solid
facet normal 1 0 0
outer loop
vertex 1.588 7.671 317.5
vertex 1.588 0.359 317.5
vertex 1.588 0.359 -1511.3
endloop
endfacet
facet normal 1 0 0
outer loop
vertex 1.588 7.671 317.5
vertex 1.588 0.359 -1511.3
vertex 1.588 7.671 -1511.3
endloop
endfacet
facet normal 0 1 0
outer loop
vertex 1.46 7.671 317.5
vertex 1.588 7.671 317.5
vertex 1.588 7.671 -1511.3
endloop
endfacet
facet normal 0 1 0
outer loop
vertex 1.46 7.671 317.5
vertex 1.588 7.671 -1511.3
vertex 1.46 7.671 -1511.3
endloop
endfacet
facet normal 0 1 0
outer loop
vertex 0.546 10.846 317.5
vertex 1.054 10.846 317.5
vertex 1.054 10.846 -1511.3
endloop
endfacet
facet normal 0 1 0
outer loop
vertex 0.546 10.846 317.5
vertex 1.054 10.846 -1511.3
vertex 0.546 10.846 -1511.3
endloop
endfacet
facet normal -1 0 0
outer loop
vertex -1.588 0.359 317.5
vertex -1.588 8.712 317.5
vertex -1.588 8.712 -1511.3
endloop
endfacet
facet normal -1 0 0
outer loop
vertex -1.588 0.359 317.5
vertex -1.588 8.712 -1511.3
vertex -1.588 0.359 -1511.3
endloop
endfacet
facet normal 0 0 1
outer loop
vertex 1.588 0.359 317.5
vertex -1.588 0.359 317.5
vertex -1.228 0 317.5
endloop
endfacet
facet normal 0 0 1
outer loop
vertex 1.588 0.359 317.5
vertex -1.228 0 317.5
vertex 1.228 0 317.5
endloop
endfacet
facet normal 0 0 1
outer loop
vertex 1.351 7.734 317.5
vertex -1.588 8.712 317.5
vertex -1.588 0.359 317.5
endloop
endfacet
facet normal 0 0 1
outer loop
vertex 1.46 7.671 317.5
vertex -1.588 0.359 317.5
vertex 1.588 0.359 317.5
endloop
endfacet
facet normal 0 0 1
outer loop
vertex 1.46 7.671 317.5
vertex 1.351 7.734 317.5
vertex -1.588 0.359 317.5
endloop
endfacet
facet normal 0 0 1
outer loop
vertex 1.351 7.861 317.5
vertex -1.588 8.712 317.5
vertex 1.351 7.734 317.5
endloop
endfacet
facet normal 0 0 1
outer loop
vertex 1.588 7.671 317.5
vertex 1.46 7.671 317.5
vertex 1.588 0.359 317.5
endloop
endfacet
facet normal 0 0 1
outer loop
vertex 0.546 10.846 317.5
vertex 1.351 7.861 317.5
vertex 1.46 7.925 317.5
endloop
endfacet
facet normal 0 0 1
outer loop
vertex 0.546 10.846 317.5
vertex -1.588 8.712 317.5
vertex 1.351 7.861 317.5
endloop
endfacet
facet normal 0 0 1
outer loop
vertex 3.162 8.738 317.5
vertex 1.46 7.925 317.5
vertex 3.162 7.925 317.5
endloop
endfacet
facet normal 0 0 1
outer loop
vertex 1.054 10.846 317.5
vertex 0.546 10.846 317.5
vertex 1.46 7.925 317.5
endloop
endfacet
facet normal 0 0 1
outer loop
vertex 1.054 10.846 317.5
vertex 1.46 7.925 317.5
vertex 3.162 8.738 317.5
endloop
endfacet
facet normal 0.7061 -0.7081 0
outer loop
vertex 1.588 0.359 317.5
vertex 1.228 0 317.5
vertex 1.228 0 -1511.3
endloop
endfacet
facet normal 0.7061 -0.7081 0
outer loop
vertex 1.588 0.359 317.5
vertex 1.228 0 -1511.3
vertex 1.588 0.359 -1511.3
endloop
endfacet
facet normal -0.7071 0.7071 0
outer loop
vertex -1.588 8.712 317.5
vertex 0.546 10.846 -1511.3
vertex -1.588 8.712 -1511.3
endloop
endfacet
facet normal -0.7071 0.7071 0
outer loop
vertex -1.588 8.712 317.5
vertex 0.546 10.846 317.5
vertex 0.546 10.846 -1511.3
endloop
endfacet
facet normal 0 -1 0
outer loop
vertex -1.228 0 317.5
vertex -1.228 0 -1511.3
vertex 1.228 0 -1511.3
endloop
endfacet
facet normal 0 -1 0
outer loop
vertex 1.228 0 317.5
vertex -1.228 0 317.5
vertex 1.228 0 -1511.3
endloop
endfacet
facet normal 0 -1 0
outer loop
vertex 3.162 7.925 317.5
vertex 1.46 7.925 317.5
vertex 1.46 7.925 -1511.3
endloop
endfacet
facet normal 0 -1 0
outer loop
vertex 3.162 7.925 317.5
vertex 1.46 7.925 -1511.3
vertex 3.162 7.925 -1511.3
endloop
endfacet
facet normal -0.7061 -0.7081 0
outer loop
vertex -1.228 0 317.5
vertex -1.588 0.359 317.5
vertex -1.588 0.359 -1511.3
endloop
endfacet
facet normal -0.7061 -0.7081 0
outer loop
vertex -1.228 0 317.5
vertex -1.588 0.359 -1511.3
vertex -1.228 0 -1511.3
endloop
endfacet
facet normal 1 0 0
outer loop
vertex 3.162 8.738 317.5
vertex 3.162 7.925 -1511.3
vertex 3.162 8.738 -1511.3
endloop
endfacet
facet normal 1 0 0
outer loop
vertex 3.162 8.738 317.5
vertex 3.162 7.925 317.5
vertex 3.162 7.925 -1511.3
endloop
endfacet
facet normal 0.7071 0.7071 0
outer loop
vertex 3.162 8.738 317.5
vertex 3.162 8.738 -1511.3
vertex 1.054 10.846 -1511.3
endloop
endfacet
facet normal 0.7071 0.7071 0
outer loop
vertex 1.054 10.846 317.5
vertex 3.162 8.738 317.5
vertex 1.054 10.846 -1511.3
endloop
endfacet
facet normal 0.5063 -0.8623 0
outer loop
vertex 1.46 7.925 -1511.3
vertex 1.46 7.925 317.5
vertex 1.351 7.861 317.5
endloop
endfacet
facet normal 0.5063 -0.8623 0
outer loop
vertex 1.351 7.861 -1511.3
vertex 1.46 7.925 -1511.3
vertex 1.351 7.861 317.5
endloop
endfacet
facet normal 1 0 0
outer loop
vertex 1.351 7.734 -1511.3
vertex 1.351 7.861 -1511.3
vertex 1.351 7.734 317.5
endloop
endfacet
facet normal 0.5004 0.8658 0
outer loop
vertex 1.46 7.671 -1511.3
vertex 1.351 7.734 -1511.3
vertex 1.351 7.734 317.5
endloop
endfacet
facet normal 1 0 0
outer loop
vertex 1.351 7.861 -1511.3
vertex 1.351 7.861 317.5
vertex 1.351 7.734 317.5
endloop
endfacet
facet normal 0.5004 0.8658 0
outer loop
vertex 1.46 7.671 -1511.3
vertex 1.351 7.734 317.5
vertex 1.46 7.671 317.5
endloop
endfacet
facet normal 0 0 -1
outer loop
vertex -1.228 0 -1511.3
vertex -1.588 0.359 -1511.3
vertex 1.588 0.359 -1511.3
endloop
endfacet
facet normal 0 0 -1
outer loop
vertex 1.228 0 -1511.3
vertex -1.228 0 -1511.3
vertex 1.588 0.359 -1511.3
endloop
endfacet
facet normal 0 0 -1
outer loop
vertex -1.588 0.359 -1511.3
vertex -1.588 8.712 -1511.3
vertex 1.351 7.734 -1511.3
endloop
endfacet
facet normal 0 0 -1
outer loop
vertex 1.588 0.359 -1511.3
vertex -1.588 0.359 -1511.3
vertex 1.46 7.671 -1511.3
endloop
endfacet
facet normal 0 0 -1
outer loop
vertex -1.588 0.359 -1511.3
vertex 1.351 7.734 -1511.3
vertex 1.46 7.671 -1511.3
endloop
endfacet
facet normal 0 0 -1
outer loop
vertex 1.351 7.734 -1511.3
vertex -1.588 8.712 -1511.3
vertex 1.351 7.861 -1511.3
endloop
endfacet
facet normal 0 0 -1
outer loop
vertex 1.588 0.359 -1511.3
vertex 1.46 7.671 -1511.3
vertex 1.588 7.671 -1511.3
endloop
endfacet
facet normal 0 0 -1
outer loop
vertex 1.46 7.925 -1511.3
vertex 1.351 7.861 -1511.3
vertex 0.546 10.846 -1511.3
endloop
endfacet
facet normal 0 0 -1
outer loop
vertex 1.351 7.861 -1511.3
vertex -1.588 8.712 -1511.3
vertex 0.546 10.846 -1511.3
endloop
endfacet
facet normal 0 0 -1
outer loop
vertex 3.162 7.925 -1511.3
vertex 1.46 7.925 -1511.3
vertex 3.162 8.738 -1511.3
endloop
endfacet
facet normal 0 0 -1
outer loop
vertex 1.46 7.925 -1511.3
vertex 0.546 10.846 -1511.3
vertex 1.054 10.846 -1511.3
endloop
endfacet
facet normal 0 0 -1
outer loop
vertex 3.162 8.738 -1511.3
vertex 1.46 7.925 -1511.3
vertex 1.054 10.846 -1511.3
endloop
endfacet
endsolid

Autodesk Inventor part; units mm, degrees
ref_plane "YZ Plane" through (0, 0, 0) normal (1, 0, 0) x (0, 1, 0)
ref_plane "XZ Plane" through (0, 0, 0) normal (0, 1, 0) x (-1, 0, 0)
ref_plane "Work Plane1" through (-1.2283, 0, 317.5) normal (0, 0, 1) x (1, 0, 0)
sketch "Sketch1" plane through (-1.2283, 0, 317.5) normal (0, 0, 1) x (1, 0, 0)
  line L0 (-0.3592, 8.7122) -> (-0.3592, 0.3592) projected
  line L1 (-0.3592, 0.3592) -> (0, 0) projected
  line L2 (0, 0) -> (2.4566, 0) projected
  line L3 (2.4566, 0) -> (2.8158, 0.3592) projected
  line L4 (2.8158, 0.3592) -> (2.8158, 7.6708) projected
  line L5 (2.8158, 7.6708) -> (2.6888, 7.6708) projected
  arc A0 (2.6888, 7.9248) -> (2.6888, 7.6708) centre (2.6888, 7.7978) ccw projected
  line L6 (2.6888, 7.9248) -> (4.3906, 7.9248) projected
  line L7 (4.3906, 7.9248) -> (4.3906, 8.7376) projected
  line L8 (4.3906, 8.7376) -> (2.2824, 10.8458) projected
  line L9 (2.2824, 10.8458) -> (1.7744, 10.8458) projected
  line L10 (1.7744, 10.8458) -> (-0.3592, 8.7122) projected
  point P0 (1.2283, 0)
extrude "Extrusion1" add sketch "Sketch1" against normal blind 1828.8
properties part number "vee-track"
